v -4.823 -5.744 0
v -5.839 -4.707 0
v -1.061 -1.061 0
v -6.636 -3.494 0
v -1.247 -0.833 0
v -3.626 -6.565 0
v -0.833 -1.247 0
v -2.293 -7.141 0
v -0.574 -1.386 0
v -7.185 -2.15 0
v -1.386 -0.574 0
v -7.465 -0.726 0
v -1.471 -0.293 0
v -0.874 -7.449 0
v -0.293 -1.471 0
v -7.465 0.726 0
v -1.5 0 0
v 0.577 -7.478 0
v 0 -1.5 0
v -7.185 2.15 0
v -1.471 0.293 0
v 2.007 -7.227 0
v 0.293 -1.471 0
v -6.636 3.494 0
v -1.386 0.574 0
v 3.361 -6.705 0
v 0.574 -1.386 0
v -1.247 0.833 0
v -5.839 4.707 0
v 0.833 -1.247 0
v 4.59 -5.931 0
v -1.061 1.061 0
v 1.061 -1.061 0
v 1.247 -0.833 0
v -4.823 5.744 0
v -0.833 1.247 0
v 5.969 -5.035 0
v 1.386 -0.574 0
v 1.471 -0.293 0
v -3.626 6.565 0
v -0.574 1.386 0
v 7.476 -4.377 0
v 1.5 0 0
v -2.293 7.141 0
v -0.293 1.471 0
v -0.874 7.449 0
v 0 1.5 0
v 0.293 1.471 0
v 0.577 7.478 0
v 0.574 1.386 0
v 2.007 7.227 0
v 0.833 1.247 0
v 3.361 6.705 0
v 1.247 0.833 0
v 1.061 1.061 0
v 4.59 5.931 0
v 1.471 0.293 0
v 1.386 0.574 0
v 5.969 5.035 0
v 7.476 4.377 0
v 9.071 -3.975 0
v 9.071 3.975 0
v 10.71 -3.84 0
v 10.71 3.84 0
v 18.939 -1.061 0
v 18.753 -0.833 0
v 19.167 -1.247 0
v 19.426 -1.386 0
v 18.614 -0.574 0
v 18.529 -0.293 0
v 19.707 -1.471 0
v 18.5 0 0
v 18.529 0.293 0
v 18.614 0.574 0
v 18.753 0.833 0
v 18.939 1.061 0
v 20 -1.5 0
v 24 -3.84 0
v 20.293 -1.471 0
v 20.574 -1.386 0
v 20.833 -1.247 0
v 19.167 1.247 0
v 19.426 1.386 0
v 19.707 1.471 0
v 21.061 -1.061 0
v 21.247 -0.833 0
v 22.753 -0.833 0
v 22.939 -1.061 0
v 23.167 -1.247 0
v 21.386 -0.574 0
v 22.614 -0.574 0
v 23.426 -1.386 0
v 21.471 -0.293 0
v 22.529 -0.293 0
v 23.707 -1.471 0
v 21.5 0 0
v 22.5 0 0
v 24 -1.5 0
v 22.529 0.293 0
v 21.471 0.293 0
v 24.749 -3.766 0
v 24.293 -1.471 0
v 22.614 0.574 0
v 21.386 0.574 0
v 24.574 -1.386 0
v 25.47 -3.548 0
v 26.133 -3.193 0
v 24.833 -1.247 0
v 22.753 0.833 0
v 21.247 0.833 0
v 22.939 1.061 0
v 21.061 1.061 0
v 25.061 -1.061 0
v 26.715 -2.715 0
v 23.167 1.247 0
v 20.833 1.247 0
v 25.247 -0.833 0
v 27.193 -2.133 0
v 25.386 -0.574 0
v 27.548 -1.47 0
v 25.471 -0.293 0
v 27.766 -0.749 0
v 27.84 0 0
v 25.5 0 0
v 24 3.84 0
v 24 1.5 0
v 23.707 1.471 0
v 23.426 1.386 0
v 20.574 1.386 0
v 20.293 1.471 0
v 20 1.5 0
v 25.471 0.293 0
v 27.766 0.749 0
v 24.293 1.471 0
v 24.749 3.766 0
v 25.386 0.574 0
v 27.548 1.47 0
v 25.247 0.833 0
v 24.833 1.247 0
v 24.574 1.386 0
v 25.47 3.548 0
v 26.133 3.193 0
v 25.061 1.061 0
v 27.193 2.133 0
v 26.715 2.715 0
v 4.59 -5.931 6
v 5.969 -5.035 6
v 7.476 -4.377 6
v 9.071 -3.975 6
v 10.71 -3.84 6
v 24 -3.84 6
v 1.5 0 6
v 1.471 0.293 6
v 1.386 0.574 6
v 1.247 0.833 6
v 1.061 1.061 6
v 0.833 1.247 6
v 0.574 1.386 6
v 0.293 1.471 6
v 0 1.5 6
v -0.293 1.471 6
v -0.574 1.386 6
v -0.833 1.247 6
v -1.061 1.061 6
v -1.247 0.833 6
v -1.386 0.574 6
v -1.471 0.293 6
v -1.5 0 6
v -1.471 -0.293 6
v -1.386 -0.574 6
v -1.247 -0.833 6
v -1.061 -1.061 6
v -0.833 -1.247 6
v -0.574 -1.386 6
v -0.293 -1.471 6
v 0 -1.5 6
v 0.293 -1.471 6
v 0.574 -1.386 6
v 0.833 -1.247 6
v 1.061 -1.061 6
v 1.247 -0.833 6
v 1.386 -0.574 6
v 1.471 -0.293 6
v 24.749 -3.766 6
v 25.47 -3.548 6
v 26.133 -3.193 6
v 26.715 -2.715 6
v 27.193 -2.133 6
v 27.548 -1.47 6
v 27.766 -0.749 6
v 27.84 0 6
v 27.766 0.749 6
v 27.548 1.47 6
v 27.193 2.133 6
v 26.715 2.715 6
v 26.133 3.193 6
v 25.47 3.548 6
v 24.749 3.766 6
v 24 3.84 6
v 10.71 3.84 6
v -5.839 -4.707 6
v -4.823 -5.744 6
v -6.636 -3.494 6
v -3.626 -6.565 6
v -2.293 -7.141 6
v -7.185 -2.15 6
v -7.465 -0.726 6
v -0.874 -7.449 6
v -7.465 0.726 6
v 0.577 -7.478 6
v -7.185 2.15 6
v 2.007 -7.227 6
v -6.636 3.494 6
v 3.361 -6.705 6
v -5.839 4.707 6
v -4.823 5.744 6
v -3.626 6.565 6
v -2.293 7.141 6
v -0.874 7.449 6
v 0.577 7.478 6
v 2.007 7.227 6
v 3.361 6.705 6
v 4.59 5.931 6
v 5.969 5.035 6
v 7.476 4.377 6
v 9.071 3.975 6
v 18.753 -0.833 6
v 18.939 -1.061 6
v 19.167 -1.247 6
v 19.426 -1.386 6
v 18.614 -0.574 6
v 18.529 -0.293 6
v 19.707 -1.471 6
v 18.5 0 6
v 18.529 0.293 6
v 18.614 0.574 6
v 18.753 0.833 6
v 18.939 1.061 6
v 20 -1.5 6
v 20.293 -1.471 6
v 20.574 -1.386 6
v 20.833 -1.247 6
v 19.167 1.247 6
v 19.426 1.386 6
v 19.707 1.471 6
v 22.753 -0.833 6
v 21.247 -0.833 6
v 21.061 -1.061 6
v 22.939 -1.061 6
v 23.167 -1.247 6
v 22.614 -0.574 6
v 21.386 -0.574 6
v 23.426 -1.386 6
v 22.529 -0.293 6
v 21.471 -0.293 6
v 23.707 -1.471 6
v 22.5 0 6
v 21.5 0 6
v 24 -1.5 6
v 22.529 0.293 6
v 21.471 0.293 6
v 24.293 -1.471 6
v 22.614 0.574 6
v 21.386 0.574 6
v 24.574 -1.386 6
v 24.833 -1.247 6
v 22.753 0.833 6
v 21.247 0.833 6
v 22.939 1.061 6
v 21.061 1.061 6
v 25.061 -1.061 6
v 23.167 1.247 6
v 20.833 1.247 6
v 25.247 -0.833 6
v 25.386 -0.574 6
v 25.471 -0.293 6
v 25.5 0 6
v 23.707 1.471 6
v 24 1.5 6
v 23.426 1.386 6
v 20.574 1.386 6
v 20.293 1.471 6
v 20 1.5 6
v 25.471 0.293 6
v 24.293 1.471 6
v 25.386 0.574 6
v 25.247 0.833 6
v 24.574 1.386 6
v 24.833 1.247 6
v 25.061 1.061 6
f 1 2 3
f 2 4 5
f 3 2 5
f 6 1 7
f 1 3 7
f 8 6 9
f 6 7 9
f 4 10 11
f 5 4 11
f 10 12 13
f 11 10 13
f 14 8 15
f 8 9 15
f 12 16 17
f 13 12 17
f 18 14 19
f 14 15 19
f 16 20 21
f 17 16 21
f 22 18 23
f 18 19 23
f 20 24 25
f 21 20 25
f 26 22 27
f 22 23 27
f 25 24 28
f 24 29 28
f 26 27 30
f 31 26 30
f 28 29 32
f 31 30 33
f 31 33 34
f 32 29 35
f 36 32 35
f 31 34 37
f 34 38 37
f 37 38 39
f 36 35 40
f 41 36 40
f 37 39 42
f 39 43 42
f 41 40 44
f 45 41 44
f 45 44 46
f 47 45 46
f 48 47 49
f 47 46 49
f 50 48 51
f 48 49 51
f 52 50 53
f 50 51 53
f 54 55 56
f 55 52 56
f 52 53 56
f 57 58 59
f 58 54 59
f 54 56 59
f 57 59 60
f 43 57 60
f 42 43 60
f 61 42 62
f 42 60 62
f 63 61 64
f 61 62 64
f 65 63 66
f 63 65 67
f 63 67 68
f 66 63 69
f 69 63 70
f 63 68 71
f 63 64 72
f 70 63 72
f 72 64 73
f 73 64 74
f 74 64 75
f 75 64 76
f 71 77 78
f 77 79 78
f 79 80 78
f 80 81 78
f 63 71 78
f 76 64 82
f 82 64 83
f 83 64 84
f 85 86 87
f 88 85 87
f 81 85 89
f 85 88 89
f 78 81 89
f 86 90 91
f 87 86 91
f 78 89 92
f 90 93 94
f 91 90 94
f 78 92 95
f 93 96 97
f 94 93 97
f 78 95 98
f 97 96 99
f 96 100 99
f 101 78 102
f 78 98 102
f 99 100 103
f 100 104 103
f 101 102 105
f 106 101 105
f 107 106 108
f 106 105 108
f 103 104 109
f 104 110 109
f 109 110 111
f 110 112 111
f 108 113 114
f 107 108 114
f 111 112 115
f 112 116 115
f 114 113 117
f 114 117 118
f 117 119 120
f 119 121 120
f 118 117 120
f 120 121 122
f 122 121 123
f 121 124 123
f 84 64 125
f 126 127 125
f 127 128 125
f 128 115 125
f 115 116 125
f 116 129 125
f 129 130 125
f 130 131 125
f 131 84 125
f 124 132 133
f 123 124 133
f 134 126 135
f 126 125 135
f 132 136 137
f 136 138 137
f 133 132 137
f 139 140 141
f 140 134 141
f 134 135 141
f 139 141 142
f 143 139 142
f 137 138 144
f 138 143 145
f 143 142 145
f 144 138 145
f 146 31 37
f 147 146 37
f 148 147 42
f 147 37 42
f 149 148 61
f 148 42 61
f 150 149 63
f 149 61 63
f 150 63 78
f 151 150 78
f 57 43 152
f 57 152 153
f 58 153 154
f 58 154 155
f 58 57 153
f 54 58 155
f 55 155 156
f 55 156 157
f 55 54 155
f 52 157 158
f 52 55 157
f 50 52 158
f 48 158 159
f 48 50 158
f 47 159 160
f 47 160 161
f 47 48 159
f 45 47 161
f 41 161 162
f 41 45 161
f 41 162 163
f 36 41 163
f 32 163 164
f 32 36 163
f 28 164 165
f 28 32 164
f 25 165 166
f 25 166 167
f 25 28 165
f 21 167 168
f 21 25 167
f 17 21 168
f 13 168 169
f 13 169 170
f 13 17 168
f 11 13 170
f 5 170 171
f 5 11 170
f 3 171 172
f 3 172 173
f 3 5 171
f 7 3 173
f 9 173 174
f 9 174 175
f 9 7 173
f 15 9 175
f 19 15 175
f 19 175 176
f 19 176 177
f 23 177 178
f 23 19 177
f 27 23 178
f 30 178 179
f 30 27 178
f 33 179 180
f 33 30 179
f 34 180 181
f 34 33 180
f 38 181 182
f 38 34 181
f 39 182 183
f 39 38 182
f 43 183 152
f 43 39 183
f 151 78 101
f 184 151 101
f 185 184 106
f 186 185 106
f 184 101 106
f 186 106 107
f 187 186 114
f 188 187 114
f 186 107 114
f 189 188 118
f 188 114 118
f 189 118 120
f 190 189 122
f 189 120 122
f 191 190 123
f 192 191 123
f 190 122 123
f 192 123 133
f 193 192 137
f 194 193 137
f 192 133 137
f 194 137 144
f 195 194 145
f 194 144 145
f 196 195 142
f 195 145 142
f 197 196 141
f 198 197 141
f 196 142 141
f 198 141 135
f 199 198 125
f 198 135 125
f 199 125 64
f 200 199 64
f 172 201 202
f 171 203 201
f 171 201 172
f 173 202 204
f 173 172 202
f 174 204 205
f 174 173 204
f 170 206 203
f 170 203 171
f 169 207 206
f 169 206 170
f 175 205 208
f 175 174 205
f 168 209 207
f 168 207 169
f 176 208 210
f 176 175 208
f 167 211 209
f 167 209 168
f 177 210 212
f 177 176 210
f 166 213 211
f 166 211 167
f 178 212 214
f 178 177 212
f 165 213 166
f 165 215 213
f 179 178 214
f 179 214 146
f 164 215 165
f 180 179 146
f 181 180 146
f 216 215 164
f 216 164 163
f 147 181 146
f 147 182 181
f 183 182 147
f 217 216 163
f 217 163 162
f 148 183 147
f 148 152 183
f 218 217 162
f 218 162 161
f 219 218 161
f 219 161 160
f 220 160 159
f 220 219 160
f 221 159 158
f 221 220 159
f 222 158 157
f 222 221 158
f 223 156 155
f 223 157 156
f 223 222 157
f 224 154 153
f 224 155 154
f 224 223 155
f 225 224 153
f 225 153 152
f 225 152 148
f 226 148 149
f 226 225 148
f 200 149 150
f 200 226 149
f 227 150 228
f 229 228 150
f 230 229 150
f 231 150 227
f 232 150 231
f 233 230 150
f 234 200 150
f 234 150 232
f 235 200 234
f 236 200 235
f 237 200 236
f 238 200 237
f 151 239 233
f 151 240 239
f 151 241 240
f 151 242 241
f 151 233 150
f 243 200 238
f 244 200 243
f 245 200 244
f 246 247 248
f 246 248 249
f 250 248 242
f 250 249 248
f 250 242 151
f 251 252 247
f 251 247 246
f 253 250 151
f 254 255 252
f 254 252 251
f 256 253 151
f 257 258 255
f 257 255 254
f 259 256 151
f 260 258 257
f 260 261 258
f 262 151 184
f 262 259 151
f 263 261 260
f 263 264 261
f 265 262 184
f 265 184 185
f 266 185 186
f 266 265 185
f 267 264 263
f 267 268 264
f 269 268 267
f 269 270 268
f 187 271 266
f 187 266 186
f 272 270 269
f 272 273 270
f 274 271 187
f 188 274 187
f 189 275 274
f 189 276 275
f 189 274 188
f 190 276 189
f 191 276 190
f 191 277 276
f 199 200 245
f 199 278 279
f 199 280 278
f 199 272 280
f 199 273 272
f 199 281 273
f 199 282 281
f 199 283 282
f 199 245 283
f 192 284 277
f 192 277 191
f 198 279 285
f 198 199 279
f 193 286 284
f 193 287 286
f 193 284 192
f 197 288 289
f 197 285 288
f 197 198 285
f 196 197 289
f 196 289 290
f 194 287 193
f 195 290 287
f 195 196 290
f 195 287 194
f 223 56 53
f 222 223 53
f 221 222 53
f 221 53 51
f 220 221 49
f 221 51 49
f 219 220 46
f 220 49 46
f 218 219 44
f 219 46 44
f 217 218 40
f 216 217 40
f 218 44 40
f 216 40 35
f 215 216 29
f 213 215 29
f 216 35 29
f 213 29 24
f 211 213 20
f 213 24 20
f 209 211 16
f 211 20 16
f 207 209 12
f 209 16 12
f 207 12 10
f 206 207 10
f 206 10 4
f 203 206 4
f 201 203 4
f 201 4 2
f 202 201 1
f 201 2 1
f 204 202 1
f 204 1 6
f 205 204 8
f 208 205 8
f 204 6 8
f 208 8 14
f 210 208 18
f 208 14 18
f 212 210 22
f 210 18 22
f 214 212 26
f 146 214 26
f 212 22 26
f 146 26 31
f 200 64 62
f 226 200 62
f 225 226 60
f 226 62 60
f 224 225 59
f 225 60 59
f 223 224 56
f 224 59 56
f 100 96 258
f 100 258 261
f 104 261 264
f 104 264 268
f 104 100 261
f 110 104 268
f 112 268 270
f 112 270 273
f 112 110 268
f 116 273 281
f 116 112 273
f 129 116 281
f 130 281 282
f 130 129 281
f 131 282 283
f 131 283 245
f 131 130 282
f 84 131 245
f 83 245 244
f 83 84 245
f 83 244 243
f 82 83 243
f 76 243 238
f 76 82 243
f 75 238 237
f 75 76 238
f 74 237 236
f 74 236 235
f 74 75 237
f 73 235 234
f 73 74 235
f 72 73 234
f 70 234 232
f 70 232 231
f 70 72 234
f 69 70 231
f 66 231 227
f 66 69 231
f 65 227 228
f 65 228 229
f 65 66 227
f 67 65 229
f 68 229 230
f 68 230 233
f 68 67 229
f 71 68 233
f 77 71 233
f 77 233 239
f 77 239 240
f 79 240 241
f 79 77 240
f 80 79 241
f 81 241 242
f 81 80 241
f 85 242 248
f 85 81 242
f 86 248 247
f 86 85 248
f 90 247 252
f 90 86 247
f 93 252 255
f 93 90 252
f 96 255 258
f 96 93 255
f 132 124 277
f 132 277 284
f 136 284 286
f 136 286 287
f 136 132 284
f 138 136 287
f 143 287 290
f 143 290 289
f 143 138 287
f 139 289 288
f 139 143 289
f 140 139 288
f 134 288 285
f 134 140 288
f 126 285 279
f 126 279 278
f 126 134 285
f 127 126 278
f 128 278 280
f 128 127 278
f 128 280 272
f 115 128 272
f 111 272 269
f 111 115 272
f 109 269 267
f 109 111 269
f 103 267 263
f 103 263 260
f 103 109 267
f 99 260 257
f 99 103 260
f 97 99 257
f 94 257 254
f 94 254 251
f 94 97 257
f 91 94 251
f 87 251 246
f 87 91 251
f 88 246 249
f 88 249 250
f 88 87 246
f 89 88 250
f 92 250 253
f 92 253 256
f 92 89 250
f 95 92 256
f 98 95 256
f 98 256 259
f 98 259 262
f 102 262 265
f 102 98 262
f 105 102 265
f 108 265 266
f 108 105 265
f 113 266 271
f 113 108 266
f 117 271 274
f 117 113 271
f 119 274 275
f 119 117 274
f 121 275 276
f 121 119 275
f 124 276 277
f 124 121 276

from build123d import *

# Parameters (mm, degrees)
SKETCH_1_R      = 1.5
EXTRUDE_2_DEPTH = 6


with BuildPart() as part:
    # 草图1 → 凸台-拉伸2 (new body)
    with BuildSketch(Plane.XY):
        with BuildLine():
            Line((24, 3.84), (10.710014006, 3.84))
            ThreePointArc((10.710014006, 3.84), (7.476263419, 4.377291236), (4.590006002, 5.931428571))
            ThreePointArc((4.590006002, 5.931428571), (-7.5, 0), (4.590006002, -5.931428571))
            ThreePointArc((4.590006002, -5.931428571), (7.476263419, -4.377291236), (10.710014006, -3.84))
            Line((10.710014006, -3.84), (24, -3.84))
            ThreePointArc((24, -3.84), (27.84, 0), (24, 3.84))
        make_face()
        Circle(SKETCH_1_R, mode=Mode.SUBTRACT)
        with Locations((20, 0)):
            Circle(SKETCH_1_R, mode=Mode.SUBTRACT)
        with Locations((24, 0)):
            Circle(SKETCH_1_R, mode=Mode.SUBTRACT)
    extrude(amount=EXTRUDE_2_DEPTH)


solid = part.part
